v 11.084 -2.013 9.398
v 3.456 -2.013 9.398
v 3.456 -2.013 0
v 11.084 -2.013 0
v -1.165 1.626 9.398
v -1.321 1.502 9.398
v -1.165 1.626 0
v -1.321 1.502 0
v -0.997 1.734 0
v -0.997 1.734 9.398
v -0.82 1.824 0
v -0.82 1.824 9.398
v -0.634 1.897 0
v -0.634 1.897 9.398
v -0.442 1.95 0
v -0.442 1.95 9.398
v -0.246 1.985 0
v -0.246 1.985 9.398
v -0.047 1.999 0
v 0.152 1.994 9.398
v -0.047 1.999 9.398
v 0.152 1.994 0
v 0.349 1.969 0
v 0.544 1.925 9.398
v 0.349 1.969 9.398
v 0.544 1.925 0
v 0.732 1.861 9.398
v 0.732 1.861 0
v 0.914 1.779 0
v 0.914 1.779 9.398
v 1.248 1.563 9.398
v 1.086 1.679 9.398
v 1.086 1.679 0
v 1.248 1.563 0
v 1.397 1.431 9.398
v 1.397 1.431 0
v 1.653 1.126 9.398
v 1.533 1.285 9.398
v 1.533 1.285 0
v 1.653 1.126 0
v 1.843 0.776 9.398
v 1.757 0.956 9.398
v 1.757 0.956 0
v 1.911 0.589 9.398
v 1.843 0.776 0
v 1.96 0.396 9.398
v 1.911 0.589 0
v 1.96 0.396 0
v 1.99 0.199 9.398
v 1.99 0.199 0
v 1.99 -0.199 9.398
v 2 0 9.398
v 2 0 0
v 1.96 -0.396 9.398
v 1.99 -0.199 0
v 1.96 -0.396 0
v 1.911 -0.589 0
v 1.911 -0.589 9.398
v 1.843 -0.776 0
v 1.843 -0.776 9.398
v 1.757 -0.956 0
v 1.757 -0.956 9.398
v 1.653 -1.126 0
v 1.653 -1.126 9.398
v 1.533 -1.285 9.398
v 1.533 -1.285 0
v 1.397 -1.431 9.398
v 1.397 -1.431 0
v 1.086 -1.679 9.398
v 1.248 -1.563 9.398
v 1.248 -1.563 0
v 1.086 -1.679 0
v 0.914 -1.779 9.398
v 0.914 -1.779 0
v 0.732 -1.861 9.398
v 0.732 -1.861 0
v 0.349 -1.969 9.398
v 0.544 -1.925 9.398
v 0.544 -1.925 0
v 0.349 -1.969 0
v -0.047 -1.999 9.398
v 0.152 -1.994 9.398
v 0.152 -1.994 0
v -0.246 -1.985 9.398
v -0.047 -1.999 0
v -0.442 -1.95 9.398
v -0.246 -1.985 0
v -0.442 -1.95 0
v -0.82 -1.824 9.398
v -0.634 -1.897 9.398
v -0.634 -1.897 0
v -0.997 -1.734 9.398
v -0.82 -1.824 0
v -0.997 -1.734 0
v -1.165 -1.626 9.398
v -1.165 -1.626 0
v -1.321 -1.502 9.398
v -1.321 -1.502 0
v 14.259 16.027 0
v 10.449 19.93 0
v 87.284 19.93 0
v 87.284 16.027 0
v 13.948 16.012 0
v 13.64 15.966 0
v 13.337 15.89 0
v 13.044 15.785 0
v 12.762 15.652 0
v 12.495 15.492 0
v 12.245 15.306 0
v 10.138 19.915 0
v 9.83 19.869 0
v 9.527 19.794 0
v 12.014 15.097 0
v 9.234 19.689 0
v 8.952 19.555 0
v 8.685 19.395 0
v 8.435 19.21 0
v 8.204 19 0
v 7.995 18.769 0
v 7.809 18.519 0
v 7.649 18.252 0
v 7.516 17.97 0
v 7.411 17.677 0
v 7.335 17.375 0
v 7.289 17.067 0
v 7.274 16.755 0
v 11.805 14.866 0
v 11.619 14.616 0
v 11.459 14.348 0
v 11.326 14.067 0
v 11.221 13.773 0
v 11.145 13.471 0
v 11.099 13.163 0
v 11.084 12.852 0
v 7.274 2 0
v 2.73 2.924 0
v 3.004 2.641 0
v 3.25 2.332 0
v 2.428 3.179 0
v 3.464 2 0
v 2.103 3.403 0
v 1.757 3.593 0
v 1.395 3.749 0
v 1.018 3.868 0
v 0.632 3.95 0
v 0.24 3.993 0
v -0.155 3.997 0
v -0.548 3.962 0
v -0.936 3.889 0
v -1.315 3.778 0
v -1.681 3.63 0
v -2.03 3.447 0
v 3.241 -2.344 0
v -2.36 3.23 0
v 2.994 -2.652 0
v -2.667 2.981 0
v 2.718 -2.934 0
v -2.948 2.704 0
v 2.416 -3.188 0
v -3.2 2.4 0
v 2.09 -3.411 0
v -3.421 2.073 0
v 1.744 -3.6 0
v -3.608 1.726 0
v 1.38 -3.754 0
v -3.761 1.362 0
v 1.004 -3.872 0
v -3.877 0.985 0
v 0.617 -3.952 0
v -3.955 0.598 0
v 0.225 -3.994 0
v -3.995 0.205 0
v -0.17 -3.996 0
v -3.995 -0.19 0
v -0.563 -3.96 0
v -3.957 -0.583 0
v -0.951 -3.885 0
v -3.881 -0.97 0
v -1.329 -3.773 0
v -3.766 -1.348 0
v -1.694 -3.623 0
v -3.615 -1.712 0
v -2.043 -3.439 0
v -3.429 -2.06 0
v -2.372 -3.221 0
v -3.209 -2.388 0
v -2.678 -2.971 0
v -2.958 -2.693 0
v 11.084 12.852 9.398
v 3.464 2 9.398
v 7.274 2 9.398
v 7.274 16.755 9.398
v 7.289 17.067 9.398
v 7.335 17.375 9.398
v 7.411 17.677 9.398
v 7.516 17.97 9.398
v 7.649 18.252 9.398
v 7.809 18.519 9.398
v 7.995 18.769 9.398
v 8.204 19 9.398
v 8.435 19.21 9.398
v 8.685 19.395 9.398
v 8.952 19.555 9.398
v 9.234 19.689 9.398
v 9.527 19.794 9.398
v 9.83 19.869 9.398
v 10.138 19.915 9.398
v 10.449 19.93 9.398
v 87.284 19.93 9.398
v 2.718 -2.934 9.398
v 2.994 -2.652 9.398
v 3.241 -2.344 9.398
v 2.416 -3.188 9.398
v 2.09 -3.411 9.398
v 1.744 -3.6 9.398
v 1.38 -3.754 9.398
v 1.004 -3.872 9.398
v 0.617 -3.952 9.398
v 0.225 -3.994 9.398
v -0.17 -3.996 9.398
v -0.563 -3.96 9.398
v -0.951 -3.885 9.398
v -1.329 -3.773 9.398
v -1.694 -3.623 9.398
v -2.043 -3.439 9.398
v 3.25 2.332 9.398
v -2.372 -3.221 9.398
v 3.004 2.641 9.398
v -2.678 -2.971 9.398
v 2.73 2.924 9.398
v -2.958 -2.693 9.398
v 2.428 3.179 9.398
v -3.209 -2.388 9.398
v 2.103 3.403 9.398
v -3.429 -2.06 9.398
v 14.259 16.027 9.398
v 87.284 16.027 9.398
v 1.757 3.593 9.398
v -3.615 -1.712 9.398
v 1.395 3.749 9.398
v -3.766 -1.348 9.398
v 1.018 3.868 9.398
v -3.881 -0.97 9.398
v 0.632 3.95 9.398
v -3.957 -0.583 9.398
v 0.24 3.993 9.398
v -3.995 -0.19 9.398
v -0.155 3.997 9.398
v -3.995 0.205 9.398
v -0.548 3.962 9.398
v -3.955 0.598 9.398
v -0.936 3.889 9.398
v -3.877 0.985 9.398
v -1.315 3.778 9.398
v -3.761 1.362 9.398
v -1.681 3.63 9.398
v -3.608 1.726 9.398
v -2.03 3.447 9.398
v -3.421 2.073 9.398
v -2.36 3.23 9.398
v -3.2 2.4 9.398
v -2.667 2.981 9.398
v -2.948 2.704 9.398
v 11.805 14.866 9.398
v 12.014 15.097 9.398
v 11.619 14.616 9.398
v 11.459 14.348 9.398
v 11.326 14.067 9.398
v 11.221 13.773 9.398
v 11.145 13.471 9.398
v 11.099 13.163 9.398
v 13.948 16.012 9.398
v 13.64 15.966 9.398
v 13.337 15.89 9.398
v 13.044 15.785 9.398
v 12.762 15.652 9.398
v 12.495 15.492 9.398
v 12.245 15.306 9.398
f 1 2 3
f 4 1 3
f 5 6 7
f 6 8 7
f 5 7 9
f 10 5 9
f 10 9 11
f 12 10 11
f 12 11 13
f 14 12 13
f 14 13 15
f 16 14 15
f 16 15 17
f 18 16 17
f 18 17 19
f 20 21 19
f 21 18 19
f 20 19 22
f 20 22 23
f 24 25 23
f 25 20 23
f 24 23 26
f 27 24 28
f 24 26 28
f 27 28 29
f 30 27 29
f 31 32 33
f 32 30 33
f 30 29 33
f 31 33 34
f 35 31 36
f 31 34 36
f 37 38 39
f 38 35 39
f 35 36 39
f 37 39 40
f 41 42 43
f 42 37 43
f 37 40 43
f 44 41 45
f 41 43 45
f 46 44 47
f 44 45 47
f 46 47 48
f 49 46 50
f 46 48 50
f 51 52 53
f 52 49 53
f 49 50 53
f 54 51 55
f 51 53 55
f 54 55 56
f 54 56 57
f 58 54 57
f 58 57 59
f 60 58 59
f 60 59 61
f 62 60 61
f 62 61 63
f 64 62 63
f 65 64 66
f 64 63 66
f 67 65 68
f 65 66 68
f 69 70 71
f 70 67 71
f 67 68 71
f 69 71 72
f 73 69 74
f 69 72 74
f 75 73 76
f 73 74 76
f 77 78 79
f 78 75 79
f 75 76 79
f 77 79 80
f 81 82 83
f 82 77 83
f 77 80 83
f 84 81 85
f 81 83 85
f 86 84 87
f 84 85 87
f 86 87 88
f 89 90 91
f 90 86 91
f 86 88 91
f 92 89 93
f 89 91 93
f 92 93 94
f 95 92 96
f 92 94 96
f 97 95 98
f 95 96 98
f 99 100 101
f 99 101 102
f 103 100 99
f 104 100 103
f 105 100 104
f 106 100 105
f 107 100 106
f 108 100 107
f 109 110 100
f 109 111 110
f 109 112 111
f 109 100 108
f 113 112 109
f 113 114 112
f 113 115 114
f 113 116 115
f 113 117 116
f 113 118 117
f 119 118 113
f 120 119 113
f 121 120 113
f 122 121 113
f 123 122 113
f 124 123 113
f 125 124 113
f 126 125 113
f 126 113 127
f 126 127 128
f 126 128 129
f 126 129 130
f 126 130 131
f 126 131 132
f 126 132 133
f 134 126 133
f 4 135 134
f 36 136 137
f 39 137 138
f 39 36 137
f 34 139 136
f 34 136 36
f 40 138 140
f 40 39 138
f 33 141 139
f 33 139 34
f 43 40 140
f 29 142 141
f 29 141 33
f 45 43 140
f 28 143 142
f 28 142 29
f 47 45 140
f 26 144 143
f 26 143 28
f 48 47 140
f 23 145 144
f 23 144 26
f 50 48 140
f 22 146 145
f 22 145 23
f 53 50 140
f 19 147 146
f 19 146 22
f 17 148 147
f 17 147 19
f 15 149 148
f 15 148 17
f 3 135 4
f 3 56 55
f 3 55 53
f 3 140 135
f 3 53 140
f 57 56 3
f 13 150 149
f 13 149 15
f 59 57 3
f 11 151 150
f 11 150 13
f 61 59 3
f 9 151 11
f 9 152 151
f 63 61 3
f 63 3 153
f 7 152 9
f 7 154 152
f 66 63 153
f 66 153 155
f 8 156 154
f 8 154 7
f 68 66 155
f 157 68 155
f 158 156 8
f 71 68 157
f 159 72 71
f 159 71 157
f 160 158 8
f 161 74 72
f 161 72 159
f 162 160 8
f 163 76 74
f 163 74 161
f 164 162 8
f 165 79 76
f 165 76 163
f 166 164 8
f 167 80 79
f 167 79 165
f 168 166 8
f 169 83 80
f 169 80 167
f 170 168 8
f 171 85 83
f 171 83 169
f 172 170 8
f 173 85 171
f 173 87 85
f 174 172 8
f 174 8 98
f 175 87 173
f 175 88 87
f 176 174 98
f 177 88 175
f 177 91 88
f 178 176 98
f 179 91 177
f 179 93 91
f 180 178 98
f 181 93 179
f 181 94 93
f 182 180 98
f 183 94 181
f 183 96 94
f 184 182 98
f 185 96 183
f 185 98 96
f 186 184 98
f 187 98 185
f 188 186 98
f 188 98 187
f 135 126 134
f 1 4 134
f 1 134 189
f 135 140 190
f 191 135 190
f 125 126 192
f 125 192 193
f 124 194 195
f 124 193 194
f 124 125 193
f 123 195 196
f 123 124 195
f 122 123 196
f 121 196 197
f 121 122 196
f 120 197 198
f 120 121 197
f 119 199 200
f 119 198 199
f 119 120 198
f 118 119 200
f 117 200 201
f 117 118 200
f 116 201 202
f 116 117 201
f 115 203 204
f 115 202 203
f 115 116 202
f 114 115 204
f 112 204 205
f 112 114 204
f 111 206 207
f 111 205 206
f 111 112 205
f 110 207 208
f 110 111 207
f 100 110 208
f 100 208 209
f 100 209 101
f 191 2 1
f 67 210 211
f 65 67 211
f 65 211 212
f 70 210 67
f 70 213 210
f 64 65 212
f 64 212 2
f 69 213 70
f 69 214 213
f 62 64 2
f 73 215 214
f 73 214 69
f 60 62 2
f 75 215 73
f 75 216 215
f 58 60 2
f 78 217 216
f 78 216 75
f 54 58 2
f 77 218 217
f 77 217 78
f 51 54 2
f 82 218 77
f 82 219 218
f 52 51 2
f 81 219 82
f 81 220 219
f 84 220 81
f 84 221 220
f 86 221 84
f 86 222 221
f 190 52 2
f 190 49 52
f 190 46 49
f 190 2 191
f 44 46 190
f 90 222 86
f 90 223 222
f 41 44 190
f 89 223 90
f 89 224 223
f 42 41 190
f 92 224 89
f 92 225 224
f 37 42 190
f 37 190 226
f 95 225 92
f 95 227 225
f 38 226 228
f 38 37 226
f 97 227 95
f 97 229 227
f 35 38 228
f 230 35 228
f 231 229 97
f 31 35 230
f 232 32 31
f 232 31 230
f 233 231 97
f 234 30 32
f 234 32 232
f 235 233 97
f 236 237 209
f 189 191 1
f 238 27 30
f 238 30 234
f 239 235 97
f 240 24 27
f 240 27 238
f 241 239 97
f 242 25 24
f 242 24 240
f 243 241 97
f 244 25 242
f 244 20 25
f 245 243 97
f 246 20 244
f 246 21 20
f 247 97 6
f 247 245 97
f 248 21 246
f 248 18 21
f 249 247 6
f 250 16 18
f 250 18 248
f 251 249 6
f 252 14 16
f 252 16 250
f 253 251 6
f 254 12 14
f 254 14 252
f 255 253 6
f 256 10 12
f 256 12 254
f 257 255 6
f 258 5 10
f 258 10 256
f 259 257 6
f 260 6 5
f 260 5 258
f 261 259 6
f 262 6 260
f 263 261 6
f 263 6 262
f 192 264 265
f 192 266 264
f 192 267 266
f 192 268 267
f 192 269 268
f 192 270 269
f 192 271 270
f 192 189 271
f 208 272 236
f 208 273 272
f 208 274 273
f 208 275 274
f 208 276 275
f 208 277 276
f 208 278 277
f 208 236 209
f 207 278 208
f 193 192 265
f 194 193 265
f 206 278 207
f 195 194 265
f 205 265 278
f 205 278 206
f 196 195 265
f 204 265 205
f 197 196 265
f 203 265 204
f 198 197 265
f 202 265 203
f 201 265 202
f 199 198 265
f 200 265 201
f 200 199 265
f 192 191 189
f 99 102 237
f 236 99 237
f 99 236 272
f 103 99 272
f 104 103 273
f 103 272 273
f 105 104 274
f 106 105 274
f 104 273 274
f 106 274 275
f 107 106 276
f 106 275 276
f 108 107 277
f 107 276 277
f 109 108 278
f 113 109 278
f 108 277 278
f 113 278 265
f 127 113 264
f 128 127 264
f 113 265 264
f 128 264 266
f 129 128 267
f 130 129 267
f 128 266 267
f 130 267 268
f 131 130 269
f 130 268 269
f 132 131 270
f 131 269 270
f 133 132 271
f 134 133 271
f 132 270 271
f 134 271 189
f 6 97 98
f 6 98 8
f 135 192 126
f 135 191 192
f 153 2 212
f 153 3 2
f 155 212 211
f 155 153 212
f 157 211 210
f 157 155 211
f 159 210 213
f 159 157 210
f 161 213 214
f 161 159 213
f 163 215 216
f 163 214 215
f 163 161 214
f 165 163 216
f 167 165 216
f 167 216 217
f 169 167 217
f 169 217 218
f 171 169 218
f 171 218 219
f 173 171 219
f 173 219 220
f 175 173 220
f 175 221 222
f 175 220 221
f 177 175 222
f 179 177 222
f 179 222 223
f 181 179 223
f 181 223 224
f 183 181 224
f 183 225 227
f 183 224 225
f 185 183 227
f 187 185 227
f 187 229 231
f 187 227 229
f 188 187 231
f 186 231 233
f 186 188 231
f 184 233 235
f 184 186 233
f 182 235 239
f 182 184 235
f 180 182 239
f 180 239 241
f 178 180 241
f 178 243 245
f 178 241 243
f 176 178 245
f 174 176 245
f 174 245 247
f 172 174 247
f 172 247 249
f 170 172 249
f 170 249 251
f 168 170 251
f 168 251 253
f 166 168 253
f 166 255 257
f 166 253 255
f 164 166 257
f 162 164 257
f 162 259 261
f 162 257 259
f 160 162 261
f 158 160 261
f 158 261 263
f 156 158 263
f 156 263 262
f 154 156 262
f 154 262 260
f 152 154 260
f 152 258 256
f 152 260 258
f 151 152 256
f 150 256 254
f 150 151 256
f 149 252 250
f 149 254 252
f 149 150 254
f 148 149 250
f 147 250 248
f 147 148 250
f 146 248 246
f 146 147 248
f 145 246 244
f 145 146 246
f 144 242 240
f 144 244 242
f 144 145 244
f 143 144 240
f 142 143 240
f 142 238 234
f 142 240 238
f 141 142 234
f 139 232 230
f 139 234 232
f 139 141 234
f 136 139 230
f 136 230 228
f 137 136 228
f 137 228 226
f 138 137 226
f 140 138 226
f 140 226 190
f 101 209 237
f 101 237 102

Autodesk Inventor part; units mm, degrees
ref_plane "YZ Plane" through (0, 0, 0) normal (1, 0, 0) x (0, 1, 0)
ref_plane "XZ Plane" through (0, 0, 0) normal (0, 1, 0) x (-1, 0, 0)
ref_plane "XY Plane" through (0, 0, 0) normal (0, 0, 1) x (1, 0, 0)
sketch "Sketch2" plane through (0, 0, 0) normal (0, 0, 1) x (1, 0, 0)
  circle A0 centre (0, 0) radius 2
  circle A1 centre (0, 0) radius 4
  line L0 (3.4641, 2) -> (6.0041, 2)
  line L1 (6.0041, 2) -> (6.0041, -2.0132)
  line L2 (6.0041, -2.0132) -> (3.4564, -2.0132)
  line L3 (-1.3208, -1.5018) -> (-1.3208, 1.5018)
  dimension "d7" = 4
  dimension "d8" = 8
  dimension "d9" = 2.54
  dimension "d10" = 4.0132
  dimension "d11" = 2
  dimension "d25" = 1.3208
extrude "Extrusion2" add sketch "Sketch2" along normal blind 9.398
sketch "Sketch3" plane through (6.0041, -2.0132, 0) normal (1, 0, 0) x (0, 0, -1)
  line L0 (-9.398, 0) -> (-9.398, 4.0132) projected
  line L1 (-9.398, 4.0132) -> (-9.398, 0)
  line L2 (-9.398, 0) -> (0, 0)
  line L3 (0, 0) -> (0, 4.0132) projected
  line L4 (0, 0) -> (0, 4.0132)
  line L5 (0, 4.0132) -> (-9.398, 4.0132) projected
  line L6 (0, 4.0132) -> (-9.398, 4.0132)
  point P0 (0, 2.0132)
extrude "Extrusion3" add sketch "Sketch3" along normal blind 5.08
sketch "Sketch4" plane through (3.4641, 2, 9.398) normal (0, 1, 0) x (1, 0, 0)
  line L0 (0, 0) -> (7.62, 0) projected
  line L1 (7.62, 0) -> (3.81, 0)
  line L2 (3.81, 0) -> (3.81, 9.398)
  line L3 (3.81, 9.398) -> (7.62, 9.398)
  line L4 (7.62, 9.398) -> (7.62, 0)
  point P0 (-3.4641, 9.398)
  dimension "d16" = 3.81
  dimension "d17" = 9.398
extrude "Extrusion4" add sketch "Sketch4" along normal blind 17.9303
sketch "Sketch5" plane through (11.0841, -2.0132, 0) normal (1, 0, 0) x (0, 0, -1)
  line L0 (0, 21.9435) -> (0, 18.04)
  line L1 (0, 18.04) -> (-9.398, 18.04)
  line L2 (-9.398, 18.04) -> (-9.398, 21.9435)
  line L3 (0, 0) -> (0, 21.9435) projected
  line L4 (-9.398, 21.9435) -> (0, 21.9435)
  point P0 (0, 2.0132)
  point P1 (-9.398, 21.9435)
  dimension "d29" = 9.398
  dimension "d30" = 3.9035
  dimension "d31" = 3.9035
extrude "Extrusion5" add sketch "Sketch5" along normal blind 76.2
fillet "Fillet1" radius 3.175 1 edges at (7.2741, 19.9303, 4.699)
fillet "Fillet2" radius 3.175 1 edges at (11.0841, 16.0268, 4.699)
sketch "Sketch6" plane through (0, 0, 9.398) normal (0, 0, 1) x (1, 0, 0)
  circle A0 centre (0, 0) radius 2 projected
  line L0 (-1.3208, -1.5018) -> (-1.3208, 1.5018)
  arc A1 (-1.3208, 1.5018) -> (-1.3208, -1.5018) centre (0, 0) ccw
  dimension "d26" = 1.3208
extrude "Extrusion6" add sketch "Sketch6" against normal blind 9.398 contours L0 A0 picked at (-1.5423, 0.0807)
properties part number "Rotator"
